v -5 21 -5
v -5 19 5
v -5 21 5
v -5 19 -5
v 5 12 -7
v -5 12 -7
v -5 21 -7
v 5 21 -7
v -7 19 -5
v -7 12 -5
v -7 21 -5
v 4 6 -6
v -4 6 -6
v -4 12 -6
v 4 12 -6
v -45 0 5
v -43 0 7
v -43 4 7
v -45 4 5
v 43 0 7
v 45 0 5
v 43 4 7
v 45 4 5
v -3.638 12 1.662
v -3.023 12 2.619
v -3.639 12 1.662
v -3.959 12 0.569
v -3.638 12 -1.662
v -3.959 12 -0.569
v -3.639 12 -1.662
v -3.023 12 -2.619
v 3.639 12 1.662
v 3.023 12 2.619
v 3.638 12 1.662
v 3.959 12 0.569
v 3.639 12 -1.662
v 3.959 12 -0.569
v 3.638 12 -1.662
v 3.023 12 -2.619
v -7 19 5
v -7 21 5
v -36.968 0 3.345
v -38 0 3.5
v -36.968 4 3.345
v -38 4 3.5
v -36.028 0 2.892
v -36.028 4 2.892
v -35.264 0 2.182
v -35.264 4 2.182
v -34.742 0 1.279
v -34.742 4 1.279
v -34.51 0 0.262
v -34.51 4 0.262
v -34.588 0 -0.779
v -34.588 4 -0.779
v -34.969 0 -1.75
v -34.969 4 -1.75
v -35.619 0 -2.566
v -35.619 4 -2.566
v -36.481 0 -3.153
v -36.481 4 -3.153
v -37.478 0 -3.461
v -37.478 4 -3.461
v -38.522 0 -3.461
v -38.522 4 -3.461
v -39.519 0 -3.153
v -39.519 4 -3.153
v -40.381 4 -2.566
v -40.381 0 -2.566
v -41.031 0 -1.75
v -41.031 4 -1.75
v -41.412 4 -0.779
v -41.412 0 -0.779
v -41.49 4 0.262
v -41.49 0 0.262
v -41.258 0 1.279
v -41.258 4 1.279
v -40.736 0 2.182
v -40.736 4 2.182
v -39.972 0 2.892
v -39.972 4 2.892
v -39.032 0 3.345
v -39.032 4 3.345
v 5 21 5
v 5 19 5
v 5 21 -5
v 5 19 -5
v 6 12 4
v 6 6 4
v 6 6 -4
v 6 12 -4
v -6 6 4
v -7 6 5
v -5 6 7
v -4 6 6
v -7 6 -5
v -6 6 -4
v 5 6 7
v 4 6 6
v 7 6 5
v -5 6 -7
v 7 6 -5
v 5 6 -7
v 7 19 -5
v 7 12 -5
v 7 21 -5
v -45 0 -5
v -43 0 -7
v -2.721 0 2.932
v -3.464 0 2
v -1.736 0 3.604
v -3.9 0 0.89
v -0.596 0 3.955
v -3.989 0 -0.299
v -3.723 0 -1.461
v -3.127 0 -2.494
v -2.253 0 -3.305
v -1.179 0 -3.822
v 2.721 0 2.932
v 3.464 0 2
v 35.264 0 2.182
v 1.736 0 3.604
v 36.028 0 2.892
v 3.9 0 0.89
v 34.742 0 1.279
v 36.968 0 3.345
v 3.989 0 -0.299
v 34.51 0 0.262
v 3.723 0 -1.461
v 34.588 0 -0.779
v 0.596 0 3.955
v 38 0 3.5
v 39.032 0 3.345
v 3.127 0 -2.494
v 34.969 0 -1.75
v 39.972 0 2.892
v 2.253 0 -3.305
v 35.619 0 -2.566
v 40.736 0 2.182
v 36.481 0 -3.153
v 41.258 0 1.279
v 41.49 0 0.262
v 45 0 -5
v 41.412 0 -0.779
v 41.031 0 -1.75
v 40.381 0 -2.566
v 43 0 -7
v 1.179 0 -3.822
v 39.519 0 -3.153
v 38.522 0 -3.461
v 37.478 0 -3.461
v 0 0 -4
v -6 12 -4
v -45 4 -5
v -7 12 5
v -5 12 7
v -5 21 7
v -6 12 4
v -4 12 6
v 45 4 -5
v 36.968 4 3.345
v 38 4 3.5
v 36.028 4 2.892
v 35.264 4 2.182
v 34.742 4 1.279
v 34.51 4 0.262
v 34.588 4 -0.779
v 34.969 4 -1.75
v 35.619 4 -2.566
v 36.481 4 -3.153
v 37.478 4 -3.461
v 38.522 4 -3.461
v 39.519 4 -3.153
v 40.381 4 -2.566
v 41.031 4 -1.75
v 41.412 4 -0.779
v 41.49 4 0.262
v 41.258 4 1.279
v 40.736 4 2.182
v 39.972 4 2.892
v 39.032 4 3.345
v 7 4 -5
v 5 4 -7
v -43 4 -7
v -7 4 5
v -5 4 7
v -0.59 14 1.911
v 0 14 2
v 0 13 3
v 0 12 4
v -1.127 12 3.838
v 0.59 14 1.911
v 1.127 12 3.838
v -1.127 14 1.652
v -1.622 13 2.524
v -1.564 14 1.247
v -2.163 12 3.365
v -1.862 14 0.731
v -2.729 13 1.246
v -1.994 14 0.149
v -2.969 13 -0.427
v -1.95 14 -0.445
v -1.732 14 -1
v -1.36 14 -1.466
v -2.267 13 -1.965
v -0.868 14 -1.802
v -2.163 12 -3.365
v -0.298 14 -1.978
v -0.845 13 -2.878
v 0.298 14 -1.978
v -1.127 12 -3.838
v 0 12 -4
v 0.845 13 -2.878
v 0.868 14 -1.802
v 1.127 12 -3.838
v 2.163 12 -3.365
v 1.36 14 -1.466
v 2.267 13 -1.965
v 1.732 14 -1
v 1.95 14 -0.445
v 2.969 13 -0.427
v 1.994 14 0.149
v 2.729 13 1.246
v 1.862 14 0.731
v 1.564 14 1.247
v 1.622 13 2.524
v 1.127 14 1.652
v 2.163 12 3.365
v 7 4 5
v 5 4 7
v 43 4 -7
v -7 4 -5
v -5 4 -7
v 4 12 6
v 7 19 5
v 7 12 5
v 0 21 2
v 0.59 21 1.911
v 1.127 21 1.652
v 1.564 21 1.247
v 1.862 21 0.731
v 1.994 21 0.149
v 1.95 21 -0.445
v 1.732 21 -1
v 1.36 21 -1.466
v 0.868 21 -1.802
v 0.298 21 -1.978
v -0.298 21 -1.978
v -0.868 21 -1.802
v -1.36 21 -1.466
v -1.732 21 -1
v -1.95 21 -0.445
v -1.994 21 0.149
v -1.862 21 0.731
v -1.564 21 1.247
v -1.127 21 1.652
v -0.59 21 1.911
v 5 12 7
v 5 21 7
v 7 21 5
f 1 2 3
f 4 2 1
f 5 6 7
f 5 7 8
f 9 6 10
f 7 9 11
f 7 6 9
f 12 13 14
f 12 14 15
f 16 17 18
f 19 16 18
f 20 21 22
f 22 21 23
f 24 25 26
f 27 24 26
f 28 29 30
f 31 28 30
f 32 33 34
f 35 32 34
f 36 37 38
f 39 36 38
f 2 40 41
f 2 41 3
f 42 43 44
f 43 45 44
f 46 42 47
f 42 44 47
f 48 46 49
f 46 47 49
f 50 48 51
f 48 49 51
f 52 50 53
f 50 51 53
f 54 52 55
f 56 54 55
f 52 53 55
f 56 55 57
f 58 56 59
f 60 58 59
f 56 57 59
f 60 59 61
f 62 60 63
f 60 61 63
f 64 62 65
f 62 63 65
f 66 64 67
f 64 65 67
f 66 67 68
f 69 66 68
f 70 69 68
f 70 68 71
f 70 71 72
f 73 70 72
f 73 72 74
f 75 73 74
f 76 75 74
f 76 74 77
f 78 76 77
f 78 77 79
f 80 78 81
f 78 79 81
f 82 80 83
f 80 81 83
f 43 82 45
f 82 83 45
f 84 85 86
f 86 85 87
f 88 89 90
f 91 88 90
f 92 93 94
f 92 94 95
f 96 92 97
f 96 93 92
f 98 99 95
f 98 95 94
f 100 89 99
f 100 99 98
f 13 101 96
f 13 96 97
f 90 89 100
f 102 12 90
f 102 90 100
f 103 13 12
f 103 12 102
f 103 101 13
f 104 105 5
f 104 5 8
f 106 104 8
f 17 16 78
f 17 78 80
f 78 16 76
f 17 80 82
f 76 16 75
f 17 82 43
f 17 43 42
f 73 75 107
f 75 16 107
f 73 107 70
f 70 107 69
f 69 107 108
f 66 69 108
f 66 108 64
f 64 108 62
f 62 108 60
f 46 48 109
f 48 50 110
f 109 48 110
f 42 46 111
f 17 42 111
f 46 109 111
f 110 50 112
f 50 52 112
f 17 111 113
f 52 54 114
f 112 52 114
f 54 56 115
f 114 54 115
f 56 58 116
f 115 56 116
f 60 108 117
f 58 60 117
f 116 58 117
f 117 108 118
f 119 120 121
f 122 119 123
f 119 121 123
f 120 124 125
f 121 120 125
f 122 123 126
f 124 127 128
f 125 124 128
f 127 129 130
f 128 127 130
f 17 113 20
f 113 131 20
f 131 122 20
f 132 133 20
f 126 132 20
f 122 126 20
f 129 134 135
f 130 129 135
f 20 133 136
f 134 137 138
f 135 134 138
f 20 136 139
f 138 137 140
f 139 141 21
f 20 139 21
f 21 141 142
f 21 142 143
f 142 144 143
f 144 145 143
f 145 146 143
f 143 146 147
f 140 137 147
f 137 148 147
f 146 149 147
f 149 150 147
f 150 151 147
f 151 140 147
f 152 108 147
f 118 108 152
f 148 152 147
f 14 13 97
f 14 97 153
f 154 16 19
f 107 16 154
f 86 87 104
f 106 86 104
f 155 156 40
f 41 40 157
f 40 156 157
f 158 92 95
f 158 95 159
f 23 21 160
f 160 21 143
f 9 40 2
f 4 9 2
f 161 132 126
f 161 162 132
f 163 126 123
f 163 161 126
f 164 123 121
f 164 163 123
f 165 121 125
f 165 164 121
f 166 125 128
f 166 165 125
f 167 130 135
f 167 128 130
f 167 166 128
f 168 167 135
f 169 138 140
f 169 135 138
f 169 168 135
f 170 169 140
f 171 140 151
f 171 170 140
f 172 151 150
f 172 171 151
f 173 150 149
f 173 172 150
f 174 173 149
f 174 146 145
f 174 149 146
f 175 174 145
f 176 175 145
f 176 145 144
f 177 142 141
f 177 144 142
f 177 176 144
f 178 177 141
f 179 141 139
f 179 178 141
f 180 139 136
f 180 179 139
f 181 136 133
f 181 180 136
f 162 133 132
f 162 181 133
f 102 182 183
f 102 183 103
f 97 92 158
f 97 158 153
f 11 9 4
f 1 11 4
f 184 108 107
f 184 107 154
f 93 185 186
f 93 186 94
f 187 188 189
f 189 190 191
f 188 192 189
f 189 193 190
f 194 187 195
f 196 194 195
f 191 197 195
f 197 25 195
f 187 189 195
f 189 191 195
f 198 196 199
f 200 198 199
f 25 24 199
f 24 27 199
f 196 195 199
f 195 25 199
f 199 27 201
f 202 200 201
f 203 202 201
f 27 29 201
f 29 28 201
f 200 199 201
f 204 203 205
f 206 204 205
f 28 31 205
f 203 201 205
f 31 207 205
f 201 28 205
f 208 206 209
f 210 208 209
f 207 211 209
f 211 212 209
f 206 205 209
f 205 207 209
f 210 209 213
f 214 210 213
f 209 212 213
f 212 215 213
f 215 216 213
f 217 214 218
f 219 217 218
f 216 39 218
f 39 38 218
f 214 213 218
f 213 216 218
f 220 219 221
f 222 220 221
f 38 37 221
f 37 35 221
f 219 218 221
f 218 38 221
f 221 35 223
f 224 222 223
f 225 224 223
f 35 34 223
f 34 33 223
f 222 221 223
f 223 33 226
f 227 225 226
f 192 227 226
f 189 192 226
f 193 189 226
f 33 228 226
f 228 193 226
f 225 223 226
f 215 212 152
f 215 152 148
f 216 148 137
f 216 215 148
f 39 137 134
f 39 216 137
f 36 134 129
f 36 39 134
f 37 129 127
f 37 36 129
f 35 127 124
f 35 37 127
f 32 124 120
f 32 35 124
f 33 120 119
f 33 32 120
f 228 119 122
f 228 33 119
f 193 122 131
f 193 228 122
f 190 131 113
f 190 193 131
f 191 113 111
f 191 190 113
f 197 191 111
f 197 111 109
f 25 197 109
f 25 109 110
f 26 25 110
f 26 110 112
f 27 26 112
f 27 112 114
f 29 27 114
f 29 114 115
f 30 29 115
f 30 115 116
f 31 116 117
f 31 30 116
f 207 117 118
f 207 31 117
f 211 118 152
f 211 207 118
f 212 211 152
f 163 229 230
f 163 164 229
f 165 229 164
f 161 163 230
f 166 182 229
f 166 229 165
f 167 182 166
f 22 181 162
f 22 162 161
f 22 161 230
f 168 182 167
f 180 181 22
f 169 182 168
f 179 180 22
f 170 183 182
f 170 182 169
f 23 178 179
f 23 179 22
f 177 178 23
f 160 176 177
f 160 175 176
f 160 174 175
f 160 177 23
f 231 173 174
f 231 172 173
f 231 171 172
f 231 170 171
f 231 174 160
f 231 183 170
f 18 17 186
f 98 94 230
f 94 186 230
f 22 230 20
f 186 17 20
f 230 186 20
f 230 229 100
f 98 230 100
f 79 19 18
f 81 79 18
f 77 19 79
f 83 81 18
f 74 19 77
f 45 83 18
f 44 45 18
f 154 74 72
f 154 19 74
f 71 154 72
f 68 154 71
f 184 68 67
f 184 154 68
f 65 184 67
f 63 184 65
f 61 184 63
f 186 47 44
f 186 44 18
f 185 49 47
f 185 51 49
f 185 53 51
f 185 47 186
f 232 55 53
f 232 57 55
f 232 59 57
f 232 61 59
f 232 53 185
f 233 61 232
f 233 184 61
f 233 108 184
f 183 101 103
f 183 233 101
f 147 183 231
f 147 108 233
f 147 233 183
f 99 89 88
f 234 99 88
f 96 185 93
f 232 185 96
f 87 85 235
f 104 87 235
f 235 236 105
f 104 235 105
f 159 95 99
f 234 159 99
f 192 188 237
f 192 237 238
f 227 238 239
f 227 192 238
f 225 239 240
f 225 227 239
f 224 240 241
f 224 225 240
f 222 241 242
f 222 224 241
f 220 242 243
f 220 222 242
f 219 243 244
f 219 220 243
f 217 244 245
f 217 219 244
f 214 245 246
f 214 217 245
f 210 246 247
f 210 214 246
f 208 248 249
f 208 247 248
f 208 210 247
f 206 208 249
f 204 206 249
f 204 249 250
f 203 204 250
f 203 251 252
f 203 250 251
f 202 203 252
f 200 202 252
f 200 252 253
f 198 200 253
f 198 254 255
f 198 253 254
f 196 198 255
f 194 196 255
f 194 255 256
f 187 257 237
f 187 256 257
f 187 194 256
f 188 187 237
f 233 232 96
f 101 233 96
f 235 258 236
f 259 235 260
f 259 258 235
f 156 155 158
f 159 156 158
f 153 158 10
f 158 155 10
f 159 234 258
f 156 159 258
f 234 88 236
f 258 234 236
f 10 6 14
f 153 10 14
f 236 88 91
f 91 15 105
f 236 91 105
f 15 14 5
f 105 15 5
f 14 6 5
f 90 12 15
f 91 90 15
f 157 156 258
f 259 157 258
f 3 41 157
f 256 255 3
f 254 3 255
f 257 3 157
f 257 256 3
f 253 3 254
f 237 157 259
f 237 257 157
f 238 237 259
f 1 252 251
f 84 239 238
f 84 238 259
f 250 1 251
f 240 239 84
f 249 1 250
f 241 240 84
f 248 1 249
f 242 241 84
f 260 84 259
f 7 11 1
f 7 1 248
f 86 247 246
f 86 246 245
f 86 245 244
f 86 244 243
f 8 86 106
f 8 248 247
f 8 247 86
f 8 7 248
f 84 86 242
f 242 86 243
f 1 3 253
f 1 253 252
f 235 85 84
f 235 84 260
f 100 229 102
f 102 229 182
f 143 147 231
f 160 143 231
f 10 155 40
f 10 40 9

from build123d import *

# Parameters (mm, degrees)
SKETCH_1_W               = 90
SKETCH_1_H               = 14
EXTRUDE_1_DEPTH          = 4
CHAMFER_1_SIZE           = 2
SKETCH_2_W               = 14
SKETCH_2_H               = 14
EXTRUDE_2_DEPTH          = 17
CUT_EXTRUDE_START        = 2
SKETCH_3_OUTSIDE_W       = 110.694
SKETCH_3_OUTSIDE_H       = 34.694
SKETCH_3_OUTSIDE_W_2     = 12
SKETCH_3_OUTSIDE_H_2     = 12
CUT_EXTRUDE_1_DEPTH      = 6
CHAMFER_2_SIZE           = 2
SKETCH_4_W               = 2
SKETCH_4_H               = 10
EXTRUDE_3_DEPTH          = 2
CUT_EXTRUDE_2_DEPTH      = 51.149775672
CUT_EXTRUDE_2_DEPTH_BACK = 51.149775672
SKETCH_5_R               = 2
CUT_EXTRUDE_3_DEPTH      = 52.019604075
CUT_EXTRUDE_3_DEPTH_BACK = 12
SKETCH_6_R               = 4
CHAMFER_3_SIZE           = 2
SKETCH_7_R               = 3.5
CUT_EXTRUDE_4_DEPTH      = 50.345719166
CUT_EXTRUDE_5_DEPTH      = 52.019604075
CUT_EXTRUDE_5_DEPTH_BACK = 4
SKETCH_8_W               = 2
SKETCH_8_H               = 10


with BuildPart() as part:
    # 草图1 → 凸台-拉伸1 (new body)
    with BuildSketch(Plane(origin=(0, 0, 0), x_dir=(1, 0, 0), z_dir=(0, 1, 0))):
        Rectangle(SKETCH_1_W, SKETCH_1_H)
    extrude(amount=EXTRUDE_1_DEPTH)

    # 倒角1
    chamfer_1_edges = [part.edges().sort_by_distance(p)[0] for p in [
        (45, 2, 7),
        (-45, 2, 7),
        (-45, 2, -7),
        (45, 2, -7),
    ]]
    chamfer(chamfer_1_edges, length=CHAMFER_1_SIZE)

    # 草图2 → 凸台-拉伸2 (add)
    with BuildSketch(Plane(origin=(0, 4, 0), x_dir=(1, 0, 0), z_dir=(0, 1, 0))):
        Rectangle(SKETCH_2_W, SKETCH_2_H)
    extrude(amount=EXTRUDE_2_DEPTH)

    # 草图3 outside → 切除-拉伸1 (cut)
    with BuildSketch(Plane(origin=(0, 4, 0), x_dir=(1, 0, 0), z_dir=(0, 1, 0)).offset(CUT_EXTRUDE_START)):
        Rectangle(SKETCH_3_OUTSIDE_W, SKETCH_3_OUTSIDE_H)
        Rectangle(SKETCH_3_OUTSIDE_W_2, SKETCH_3_OUTSIDE_H_2, mode=Mode.SUBTRACT)
    extrude(amount=CUT_EXTRUDE_1_DEPTH, mode=Mode.SUBTRACT)

    # 倒角2
    chamfer_2_edges = [part.edges().sort_by_distance(p)[0] for p in [
        (7, 16.5, 7),
        (7, 16.5, -7),
        (-7, 16.5, -7),
        (-7, 16.5, 7),
        (-7, 5, 7),
        (-7, 5, -7),
        (7, 5, -7),
        (7, 5, 7),
        (6, 9, -6),
        (-6, 9, -6),
        (-6, 9, 6),
        (6, 9, 6),
    ]]
    chamfer(chamfer_2_edges, length=CHAMFER_2_SIZE)

    # 草图4 → 凸台-拉伸3 (add)
    with BuildSketch(Plane(origin=(0, 21, 0), x_dir=(1, 0, 0), z_dir=(0, 1, 0))):
        with Locations((-6, 0)):
            Rectangle(SKETCH_4_W, SKETCH_4_H)
    extrude_3 = extrude(amount=EXTRUDE_3_DEPTH)

    # 镜向1: 凸台-拉伸3 across plane
    add(extrude_3.mirror(Plane(origin=(0, 0, 0), x_dir=(0, 0, 1), z_dir=(1, 0, 0))))

    # 草图5 → 切除-拉伸2 (cut, two sides: drawn at the far end of the back side and taken through both)
    with BuildSketch(Plane(origin=(0, 21, 0), x_dir=(1, 0, 0), z_dir=(0, 1, 0)).offset(-CUT_EXTRUDE_2_DEPTH_BACK)):
        with Locations(Location((0, 0, 0), (0, 0, 270))):
            Circle(SKETCH_5_R)
    extrude(amount=CUT_EXTRUDE_2_DEPTH + CUT_EXTRUDE_2_DEPTH_BACK, mode=Mode.SUBTRACT)

    # 草图6 → 切除-拉伸3 (cut, two sides: drawn at the far end of the back side and taken through both)
    with BuildSketch(Plane.XZ.offset(-CUT_EXTRUDE_3_DEPTH_BACK)):
        with Locations(Location((0, 0, 0), (0, 0, 270))):
            Circle(SKETCH_6_R)
    extrude(amount=CUT_EXTRUDE_3_DEPTH + CUT_EXTRUDE_3_DEPTH_BACK, mode=Mode.SUBTRACT)

    # 倒角3
    chamfer_3_edges = [part.edges().sort_by_distance(p)[0] for p in [
        (0, 12, -2),
    ]]
    chamfer(chamfer_3_edges, length=CHAMFER_3_SIZE - 0.0001)  # a hair under: the kernel refuses the full size

    # 草图7 → 切除-拉伸4 (cut, symmetric)
    with BuildSketch(Plane(origin=(0, 4, 0), x_dir=(1, 0, 0), z_dir=(0, 1, 0))):
        with Locations(Location((-38, 0, 0), (0, 0, 270))):
            Circle(SKETCH_7_R)
    cut_extrude_4 = extrude(amount=CUT_EXTRUDE_4_DEPTH, both=True, mode=Mode.SUBTRACT)

    # 镜向2: 切除-拉伸4 across plane
    add(cut_extrude_4.mirror(Plane(origin=(0, 0, 0), x_dir=(0, 0, 1), z_dir=(1, 0, 0))), mode=Mode.SUBTRACT)

    # 草图8 → 切除-拉伸5 (cut, two sides: drawn at the far end of the back side and taken through both)
    with BuildSketch(Plane(origin=(0, 23, 0), x_dir=(1, 0, 0), z_dir=(0, 1, 0)).offset(-CUT_EXTRUDE_5_DEPTH_BACK)):
        with Locations((6, 0)):
            Rectangle(SKETCH_8_W, SKETCH_8_H)
        with Locations((-6, 0)):
            Rectangle(SKETCH_8_W, SKETCH_8_H)
    extrude(amount=CUT_EXTRUDE_5_DEPTH + CUT_EXTRUDE_5_DEPTH_BACK, mode=Mode.SUBTRACT)


solid = part.part
